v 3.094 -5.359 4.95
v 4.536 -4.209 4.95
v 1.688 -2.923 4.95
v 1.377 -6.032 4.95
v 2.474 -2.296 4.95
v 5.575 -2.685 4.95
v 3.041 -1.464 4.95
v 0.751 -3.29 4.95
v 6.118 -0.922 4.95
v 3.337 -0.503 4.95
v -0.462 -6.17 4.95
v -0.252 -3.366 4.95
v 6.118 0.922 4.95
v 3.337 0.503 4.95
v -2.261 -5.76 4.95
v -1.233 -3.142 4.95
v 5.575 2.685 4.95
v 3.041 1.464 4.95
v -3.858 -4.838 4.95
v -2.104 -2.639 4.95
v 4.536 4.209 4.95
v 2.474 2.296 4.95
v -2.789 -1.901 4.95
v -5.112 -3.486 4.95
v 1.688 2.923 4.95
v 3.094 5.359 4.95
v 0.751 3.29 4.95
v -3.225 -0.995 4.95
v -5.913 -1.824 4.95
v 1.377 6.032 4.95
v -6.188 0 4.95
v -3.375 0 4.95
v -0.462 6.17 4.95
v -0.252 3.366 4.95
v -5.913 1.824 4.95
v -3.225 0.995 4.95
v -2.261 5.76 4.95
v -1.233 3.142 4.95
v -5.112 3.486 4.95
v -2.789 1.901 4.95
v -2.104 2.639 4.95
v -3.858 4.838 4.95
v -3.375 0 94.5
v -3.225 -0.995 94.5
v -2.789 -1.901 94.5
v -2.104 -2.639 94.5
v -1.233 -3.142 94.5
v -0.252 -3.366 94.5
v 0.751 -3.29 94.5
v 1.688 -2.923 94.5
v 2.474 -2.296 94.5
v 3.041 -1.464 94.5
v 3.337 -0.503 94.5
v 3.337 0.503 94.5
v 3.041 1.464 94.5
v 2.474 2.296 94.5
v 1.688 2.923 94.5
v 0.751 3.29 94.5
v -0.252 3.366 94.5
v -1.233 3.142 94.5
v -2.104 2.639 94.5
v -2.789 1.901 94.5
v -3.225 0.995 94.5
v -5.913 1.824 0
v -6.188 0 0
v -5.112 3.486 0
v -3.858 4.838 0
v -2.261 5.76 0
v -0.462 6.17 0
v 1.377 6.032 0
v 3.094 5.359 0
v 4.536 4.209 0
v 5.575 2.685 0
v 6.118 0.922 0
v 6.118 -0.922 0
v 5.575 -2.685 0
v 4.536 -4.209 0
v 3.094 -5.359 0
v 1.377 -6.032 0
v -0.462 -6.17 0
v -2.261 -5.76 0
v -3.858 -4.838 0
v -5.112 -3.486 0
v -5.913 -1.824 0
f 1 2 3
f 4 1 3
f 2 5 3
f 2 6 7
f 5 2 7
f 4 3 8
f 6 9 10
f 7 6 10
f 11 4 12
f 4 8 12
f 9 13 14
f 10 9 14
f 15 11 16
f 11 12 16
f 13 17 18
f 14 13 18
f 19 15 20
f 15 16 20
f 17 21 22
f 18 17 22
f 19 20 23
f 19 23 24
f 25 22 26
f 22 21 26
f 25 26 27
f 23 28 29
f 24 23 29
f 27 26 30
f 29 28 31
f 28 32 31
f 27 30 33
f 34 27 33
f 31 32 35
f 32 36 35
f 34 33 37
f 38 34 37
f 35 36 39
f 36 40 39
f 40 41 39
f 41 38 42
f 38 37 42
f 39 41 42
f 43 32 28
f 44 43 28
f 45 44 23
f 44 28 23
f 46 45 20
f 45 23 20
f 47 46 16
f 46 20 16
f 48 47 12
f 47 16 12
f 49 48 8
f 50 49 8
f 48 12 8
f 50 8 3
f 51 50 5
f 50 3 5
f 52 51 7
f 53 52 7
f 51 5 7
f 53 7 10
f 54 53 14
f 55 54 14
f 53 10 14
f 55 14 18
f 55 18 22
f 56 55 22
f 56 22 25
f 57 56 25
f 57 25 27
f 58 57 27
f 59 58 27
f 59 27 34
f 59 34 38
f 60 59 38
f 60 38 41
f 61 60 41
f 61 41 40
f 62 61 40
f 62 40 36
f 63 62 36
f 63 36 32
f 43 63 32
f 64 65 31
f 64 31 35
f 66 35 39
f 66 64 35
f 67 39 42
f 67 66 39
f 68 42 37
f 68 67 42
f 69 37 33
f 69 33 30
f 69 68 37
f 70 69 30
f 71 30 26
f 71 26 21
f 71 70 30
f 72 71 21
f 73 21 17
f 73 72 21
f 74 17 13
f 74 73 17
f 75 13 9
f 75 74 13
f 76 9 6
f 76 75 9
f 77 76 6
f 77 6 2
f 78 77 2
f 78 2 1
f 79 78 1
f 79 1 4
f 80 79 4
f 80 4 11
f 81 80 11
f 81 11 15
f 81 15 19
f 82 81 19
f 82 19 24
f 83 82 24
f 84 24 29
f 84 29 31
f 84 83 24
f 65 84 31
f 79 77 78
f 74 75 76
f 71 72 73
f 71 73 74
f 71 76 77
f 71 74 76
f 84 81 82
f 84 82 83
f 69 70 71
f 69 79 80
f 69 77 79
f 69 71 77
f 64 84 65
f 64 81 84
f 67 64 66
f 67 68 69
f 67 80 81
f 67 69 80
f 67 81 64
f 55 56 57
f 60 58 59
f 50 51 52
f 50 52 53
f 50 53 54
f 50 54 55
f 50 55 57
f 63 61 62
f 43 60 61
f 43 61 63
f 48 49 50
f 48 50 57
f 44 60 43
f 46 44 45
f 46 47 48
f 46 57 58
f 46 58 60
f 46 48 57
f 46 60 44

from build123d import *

# Parameters (mm, degrees)
SKETCH1_R           = 1.5
BOSS_EXTRUDE1_DEPTH = 42
SKETCH2_R           = 2.75
BOSS_EXTRUDE2_DEPTH = 2.2
ESCALA1_SCALE       = 1.5
ESCALA2_SCALE       = 1.5


with BuildPart() as part:
    # Sketch1 → Boss-Extrude1 (new body)
    with BuildSketch(Plane.XY):
        with Locations(Location((0, 0, 0), (0, 0, 180))):
            Circle(SKETCH1_R)
    extrude(amount=BOSS_EXTRUDE1_DEPTH)

    # Sketch2 → Boss-Extrude2 (add)
    with BuildSketch(Plane(origin=(0, 0, 0), x_dir=(-1, 0, 0), z_dir=(0, 0, -1))):
        Circle(SKETCH2_R)
    extrude(amount=-BOSS_EXTRUDE2_DEPTH)


with BuildPart() as part_1:
    # Escala1: scaled about (0, 0, 0)
    add(part.part.scale(ESCALA1_SCALE))


with BuildPart() as part_2:
    # Escala2: scaled about (0, 0, 0)
    add(part_1.part.scale(ESCALA2_SCALE))


solid = part_2.part
